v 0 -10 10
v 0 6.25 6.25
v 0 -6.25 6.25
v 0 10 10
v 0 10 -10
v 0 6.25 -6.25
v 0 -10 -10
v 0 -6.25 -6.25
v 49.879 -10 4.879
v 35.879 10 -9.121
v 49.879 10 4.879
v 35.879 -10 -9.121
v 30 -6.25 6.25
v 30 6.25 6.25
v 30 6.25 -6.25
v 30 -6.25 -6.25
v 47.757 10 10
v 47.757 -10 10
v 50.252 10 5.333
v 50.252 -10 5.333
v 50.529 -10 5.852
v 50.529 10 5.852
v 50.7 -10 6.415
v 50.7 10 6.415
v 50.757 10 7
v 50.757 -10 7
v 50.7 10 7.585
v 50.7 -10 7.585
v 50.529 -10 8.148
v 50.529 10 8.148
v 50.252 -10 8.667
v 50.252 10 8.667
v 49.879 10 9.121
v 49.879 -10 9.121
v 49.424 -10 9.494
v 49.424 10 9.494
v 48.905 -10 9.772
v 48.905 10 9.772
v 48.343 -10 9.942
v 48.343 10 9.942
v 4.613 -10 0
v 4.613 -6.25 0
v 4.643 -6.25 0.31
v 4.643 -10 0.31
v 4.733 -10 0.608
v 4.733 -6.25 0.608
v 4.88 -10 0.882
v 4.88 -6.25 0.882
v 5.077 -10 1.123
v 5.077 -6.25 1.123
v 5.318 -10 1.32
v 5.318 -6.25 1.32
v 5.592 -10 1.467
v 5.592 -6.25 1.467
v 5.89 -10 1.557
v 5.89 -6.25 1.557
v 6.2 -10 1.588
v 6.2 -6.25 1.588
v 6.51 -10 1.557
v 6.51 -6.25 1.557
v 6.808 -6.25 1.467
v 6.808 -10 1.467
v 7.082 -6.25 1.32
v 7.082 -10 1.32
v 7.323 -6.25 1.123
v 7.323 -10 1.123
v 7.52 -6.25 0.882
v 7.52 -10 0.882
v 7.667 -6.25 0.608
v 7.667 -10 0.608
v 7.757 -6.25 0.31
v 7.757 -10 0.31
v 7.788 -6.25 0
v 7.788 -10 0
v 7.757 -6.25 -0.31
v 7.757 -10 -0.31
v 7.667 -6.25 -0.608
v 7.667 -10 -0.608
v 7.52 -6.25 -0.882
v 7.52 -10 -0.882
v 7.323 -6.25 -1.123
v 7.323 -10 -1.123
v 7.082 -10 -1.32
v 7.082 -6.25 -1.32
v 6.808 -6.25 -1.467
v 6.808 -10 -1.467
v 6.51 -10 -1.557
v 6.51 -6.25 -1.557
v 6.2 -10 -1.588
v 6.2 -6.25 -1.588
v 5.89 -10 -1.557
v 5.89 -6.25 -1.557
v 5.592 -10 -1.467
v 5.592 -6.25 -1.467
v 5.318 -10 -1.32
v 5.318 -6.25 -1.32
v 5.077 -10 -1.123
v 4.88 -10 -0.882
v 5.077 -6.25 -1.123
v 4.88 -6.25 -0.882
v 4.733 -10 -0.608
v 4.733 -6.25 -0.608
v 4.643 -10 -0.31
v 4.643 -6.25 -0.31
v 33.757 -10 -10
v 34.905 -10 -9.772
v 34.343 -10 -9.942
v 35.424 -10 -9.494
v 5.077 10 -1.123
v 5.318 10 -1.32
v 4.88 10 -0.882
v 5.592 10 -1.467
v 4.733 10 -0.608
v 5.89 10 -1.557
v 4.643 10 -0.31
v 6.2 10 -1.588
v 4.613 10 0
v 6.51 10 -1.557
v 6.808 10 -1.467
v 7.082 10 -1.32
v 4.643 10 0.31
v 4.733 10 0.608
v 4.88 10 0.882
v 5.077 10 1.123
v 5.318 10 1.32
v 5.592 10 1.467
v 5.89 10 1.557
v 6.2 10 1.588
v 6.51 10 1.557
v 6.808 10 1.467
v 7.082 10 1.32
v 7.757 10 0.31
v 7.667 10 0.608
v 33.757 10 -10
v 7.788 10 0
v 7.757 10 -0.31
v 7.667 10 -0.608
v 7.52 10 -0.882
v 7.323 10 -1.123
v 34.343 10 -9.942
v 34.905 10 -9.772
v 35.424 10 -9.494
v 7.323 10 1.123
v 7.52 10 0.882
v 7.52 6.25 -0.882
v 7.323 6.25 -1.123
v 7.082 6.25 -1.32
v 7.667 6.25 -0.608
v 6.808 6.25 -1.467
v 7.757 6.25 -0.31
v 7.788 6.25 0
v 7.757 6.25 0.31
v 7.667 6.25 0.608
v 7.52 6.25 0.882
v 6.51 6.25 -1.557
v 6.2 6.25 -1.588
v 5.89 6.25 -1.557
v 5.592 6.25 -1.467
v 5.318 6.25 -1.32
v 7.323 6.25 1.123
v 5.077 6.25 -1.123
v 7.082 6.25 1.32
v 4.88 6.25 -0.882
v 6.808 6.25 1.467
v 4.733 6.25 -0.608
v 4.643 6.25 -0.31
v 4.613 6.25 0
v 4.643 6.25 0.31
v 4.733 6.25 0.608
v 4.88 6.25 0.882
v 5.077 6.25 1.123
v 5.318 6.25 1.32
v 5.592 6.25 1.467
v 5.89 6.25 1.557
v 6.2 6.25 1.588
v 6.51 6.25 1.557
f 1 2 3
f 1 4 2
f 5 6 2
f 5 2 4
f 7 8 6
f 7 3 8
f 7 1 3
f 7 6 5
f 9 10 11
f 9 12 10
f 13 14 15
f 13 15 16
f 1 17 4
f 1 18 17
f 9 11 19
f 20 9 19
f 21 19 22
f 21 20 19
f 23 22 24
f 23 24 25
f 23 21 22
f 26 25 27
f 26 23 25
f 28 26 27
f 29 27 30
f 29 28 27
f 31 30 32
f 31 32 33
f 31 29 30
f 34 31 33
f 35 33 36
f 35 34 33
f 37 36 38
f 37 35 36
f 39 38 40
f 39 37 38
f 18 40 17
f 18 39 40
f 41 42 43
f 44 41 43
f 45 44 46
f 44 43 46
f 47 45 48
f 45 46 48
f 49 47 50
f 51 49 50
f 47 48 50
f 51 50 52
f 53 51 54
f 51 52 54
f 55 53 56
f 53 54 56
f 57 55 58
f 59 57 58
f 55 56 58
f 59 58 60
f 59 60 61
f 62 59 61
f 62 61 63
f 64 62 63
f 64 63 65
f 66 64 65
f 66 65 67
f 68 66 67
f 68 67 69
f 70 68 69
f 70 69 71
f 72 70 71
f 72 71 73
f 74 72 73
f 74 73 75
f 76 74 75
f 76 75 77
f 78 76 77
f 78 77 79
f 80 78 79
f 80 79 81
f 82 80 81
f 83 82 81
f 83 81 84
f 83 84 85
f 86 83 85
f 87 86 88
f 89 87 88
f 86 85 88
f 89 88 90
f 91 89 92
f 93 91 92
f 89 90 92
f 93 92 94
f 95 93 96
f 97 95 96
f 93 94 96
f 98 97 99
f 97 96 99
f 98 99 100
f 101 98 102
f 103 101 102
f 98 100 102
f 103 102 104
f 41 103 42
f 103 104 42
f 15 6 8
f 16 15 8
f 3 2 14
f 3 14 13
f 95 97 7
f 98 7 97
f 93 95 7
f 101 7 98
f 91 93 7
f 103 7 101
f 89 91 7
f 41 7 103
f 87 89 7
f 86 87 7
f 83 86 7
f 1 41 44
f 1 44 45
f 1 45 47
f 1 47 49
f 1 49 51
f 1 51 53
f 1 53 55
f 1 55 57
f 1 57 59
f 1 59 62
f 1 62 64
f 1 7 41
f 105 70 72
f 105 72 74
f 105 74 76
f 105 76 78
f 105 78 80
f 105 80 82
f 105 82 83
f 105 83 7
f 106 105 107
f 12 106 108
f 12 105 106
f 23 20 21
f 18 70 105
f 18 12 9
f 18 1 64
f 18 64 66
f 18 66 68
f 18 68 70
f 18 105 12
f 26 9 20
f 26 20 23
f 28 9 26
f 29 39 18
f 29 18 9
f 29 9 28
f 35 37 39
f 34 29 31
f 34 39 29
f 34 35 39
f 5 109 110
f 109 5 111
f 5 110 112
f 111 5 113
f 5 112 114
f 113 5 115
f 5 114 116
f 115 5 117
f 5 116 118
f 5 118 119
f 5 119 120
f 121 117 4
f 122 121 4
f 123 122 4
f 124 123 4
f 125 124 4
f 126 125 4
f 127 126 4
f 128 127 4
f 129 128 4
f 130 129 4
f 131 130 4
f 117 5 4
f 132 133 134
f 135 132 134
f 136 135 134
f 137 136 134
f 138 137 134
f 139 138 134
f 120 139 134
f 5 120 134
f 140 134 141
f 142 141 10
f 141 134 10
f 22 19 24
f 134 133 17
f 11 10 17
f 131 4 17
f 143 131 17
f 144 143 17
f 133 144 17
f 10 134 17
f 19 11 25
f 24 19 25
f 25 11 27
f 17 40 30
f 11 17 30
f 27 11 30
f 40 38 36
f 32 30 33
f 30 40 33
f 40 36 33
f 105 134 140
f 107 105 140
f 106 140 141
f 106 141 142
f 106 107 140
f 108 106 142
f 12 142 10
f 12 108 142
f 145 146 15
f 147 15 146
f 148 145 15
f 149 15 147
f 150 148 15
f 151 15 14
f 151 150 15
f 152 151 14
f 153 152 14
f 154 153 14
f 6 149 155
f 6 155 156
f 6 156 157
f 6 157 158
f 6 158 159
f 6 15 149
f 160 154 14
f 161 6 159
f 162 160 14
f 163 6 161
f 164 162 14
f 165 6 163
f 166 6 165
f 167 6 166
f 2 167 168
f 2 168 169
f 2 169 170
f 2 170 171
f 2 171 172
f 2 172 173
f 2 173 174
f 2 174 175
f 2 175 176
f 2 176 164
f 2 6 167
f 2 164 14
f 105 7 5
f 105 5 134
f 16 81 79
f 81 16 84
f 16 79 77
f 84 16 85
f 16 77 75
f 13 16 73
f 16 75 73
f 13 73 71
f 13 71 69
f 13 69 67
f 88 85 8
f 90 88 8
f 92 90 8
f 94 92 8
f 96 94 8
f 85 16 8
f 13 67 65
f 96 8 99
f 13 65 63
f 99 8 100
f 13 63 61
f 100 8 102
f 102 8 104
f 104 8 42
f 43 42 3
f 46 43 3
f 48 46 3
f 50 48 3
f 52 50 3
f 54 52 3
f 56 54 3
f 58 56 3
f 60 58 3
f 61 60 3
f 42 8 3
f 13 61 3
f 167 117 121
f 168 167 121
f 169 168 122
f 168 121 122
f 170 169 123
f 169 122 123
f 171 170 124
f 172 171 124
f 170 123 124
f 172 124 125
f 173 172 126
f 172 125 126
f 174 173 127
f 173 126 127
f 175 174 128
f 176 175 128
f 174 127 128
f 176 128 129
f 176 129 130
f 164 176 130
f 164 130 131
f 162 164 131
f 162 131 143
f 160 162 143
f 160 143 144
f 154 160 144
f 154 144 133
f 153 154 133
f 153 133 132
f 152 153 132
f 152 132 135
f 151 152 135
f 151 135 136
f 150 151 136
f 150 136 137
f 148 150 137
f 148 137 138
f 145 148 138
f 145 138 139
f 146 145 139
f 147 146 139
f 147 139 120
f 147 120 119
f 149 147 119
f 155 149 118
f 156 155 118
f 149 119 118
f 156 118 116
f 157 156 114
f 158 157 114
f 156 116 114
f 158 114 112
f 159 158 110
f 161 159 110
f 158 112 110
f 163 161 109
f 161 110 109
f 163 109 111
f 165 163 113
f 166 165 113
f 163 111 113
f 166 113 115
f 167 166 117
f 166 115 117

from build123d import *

# Parameters (mm, degrees)
F1_DEPTH = 10
F2_W     = 12.5
F2_H     = 12.5
F3_DEPTH = 30
F5_D     = 3.175


with BuildPart() as f1:
    # F0 (on Front) → F1 (new body, symmetric)
    with BuildSketch(Plane.XZ):
        with BuildLine():
            Line((47.757359, 10), (0, 10))
            Line((0, 10), (0, -10))
            Line((0, -10), (33.757359, -10))
            ThreePointArc((33.757359, -10), (34.90541, -9.771639), (35.87868, -9.12132))
            Line((35.87868, -9.12132), (49.87868, 4.87868))
            ThreePointArc((49.87868, 4.87868), (50.528998, 8.14805), (47.757359, 10))
        make_face()
    extrude(amount=F1_DEPTH, both=True)

    # F2 (on face) → F3 (cut)
    with BuildSketch(Plane(origin=(0, 0, 0), x_dir=(0, -1, 0), z_dir=(-1, 0, 0))):
        Rectangle(F2_W, F2_H)
    extrude(amount=-F3_DEPTH, mode=Mode.SUBTRACT)

    # F5 (through all)
    with Locations(Plane.XZ.offset(10)):
        with Locations((6.2, 0)):
            Hole(F5_D / 2)


solid = f1.part
